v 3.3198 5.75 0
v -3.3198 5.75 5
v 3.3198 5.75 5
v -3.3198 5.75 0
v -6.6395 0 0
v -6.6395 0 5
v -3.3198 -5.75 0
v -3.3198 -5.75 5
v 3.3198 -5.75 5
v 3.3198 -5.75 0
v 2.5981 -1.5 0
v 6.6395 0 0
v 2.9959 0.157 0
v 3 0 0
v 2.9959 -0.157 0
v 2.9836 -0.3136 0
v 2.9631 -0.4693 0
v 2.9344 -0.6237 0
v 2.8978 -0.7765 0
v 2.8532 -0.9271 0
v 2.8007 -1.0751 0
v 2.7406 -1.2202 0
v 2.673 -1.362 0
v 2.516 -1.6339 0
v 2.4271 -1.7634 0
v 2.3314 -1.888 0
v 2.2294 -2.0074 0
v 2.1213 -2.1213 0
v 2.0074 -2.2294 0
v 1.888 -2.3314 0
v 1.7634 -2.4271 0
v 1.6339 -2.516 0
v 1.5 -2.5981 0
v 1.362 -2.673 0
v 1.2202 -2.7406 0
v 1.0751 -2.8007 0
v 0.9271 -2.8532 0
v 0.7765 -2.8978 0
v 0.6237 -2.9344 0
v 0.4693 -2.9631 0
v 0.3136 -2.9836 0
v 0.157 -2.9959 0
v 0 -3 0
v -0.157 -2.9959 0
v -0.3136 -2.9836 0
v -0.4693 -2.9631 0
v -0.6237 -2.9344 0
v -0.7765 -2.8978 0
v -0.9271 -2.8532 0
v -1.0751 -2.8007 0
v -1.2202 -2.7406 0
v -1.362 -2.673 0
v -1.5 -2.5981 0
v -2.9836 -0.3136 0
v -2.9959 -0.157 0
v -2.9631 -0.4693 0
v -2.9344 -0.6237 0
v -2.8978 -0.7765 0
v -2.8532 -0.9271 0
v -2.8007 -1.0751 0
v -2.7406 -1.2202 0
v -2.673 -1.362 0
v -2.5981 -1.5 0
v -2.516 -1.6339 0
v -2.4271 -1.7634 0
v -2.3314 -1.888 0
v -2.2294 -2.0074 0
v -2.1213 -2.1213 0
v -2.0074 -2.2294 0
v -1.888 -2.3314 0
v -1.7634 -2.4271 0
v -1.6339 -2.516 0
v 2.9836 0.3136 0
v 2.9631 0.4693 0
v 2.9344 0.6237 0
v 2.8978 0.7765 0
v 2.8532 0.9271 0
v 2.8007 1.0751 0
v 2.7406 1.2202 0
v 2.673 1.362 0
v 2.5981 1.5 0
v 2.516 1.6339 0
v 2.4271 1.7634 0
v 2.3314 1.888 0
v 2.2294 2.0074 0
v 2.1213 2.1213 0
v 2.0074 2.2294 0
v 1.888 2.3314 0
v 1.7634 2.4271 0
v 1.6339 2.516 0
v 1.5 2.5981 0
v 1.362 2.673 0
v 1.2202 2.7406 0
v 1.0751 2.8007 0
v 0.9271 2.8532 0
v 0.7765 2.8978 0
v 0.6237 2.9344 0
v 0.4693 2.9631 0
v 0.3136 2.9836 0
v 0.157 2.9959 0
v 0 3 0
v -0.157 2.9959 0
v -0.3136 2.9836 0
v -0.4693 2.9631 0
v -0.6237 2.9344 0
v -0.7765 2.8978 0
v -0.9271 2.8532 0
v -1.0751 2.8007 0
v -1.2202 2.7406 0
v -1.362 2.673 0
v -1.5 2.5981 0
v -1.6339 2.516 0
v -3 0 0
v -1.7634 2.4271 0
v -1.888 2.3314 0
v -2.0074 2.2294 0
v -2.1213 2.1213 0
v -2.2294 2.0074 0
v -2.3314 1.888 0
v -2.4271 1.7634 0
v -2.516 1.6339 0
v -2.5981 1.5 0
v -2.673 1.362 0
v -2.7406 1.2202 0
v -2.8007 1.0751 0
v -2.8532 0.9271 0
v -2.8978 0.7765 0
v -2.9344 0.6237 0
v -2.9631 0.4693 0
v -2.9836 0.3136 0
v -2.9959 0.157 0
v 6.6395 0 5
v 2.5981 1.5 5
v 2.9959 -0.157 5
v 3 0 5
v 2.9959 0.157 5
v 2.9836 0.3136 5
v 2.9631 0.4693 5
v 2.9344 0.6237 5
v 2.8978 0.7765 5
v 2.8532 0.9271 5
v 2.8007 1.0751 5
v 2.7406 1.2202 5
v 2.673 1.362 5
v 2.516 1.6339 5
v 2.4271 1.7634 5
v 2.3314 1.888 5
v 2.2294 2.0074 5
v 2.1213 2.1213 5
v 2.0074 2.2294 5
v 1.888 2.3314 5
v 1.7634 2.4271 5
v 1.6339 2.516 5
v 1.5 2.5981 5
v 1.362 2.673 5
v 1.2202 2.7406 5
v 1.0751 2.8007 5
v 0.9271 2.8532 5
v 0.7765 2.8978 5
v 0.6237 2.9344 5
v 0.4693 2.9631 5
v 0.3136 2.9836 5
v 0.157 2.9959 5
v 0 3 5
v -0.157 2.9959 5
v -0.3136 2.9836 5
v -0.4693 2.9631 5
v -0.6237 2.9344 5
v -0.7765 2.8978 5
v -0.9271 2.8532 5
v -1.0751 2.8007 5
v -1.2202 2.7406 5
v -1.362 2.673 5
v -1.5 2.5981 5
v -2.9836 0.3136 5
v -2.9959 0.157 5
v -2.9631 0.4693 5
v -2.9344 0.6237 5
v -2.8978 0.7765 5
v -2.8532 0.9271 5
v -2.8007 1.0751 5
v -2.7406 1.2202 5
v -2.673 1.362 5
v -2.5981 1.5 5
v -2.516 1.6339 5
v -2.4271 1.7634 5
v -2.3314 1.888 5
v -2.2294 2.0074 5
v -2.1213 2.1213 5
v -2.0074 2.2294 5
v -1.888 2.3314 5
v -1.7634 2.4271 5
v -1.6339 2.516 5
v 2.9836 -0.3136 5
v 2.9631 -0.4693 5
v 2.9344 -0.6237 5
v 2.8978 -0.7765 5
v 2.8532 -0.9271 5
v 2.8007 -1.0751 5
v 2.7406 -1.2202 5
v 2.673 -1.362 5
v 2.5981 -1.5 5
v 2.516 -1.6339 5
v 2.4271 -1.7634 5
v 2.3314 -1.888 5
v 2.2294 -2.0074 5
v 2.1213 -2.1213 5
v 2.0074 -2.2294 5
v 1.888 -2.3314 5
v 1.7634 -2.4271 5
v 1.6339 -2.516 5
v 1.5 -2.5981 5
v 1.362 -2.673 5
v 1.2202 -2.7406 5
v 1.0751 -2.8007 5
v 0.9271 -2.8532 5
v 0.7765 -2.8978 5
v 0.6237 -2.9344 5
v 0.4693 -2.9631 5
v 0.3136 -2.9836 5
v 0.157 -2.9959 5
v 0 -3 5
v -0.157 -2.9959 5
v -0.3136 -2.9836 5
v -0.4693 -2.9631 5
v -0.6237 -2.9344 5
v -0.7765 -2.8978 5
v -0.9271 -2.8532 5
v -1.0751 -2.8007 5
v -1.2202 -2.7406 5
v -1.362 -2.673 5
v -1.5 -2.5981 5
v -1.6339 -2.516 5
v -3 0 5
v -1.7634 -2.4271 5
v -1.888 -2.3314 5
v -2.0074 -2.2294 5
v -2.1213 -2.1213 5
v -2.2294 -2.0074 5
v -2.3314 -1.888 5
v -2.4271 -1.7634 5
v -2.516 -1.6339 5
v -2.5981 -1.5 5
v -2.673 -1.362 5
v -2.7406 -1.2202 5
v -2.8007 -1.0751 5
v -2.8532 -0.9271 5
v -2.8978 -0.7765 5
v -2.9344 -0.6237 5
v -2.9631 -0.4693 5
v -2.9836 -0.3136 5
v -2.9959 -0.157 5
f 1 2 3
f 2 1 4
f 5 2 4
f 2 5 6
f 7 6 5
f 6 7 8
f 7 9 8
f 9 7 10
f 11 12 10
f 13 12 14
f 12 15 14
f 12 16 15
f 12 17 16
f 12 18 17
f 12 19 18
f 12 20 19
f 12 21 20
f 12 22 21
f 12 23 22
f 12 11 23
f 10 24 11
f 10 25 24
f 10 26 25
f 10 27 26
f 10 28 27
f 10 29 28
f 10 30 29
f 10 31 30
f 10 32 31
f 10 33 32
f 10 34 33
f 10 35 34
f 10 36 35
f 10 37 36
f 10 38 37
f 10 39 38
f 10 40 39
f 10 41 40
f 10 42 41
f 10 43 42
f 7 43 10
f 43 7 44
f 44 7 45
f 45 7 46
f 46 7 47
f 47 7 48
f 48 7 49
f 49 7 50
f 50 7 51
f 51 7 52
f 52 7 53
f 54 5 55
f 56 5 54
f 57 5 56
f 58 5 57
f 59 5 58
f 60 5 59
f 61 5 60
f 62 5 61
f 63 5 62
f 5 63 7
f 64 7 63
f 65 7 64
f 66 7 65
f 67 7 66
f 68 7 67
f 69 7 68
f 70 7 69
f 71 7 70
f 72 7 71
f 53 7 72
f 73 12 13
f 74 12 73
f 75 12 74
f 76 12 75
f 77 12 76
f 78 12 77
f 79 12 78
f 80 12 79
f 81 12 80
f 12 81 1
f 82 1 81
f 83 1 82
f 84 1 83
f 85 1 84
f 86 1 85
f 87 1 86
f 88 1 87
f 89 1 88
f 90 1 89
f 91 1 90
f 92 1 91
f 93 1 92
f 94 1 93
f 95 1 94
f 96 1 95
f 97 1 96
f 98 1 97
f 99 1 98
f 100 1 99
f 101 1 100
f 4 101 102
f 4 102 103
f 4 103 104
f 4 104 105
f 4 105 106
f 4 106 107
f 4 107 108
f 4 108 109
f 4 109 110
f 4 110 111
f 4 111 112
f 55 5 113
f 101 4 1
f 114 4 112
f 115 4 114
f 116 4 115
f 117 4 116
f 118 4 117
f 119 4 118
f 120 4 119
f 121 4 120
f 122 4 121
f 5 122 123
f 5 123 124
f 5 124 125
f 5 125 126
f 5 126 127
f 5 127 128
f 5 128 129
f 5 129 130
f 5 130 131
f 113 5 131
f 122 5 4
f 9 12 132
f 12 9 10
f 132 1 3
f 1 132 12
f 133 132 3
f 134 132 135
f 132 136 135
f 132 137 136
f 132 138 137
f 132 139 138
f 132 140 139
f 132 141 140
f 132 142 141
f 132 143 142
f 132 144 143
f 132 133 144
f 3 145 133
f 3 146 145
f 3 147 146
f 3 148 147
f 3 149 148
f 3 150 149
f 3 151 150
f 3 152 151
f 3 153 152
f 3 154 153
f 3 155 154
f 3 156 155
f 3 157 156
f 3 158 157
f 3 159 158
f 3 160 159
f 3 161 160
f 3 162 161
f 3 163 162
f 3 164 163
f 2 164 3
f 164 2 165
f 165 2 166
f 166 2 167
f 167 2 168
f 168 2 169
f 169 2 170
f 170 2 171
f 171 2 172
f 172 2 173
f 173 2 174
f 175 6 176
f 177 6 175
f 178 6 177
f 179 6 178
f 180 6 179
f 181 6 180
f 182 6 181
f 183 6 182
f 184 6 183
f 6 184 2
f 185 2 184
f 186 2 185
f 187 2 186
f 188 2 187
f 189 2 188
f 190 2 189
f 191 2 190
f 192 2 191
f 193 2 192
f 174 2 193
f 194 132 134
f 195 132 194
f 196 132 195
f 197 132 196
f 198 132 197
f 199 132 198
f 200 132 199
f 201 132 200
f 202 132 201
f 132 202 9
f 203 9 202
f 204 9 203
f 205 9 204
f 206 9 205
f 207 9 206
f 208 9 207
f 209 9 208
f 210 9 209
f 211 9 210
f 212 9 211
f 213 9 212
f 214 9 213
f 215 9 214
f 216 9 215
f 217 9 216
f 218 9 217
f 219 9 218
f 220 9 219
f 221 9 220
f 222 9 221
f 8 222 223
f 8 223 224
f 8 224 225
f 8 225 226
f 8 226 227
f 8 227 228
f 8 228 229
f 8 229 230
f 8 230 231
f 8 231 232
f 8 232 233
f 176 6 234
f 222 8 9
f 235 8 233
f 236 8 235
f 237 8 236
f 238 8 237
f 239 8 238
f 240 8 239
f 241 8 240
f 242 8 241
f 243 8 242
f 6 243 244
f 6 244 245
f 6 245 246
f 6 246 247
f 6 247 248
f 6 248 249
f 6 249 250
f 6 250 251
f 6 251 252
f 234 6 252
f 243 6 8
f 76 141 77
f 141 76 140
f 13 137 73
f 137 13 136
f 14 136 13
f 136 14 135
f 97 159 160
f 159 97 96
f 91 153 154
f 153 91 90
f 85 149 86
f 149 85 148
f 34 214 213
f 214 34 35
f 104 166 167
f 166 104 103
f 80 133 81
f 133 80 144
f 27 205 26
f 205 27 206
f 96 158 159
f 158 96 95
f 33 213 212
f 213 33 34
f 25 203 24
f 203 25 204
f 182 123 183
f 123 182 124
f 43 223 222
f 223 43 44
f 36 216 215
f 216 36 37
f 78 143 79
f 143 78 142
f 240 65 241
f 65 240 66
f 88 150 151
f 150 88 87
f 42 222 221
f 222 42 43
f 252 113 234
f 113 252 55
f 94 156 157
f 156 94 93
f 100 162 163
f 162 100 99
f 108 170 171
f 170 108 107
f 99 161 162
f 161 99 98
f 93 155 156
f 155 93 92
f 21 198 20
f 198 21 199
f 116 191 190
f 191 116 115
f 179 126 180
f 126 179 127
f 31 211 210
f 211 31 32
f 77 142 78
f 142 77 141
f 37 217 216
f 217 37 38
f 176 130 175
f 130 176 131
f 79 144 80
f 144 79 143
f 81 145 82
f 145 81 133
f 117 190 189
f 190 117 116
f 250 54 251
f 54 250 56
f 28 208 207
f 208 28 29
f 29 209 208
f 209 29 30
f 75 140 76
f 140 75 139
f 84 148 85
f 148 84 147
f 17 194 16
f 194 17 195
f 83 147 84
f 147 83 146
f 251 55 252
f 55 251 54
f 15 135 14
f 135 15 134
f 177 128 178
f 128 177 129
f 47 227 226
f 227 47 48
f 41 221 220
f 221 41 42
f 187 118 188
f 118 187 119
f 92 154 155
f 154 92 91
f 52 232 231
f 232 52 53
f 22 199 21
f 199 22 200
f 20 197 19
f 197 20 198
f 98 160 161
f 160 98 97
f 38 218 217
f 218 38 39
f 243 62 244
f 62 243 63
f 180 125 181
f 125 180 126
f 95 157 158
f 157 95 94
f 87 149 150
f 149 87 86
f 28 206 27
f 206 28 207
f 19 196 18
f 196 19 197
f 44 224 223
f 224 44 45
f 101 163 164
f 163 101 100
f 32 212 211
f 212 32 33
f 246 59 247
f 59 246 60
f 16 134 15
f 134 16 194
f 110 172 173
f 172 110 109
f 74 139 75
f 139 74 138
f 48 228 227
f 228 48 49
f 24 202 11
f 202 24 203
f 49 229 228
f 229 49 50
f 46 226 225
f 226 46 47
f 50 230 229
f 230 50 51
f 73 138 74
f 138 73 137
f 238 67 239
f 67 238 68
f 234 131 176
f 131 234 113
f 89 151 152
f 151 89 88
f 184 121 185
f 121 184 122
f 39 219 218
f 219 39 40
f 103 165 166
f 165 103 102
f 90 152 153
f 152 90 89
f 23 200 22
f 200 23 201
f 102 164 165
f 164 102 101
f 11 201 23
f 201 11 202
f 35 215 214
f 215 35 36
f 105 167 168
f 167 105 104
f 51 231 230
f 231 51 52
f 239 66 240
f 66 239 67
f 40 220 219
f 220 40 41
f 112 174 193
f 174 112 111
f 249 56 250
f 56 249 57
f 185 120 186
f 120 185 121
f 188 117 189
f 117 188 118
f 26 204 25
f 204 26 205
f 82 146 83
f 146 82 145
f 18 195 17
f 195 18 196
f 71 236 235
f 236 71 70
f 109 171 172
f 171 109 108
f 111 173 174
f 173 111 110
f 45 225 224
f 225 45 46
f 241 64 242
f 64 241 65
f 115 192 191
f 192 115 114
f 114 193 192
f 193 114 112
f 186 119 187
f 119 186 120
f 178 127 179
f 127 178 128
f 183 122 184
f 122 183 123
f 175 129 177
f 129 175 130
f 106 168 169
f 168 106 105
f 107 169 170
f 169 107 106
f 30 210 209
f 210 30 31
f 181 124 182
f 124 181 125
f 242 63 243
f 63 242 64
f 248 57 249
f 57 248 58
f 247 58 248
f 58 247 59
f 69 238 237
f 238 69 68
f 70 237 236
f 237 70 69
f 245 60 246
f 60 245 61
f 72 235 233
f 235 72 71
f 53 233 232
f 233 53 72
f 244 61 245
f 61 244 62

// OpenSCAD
$fn = 120;

across_flats = 11.5;   // mm
thickness    = 5.0;    // mm
hole_d       = 6.0;    // mm (clearance hole as specified)

module hex_prism_af(af, h){
    // For a regular hexagon: across_flats = 2 * apothem
    // Circumradius R = apothem / cos(30°) = (af/2) / cos(30°)
    R = (af/2) / cos(30);
    linear_extrude(height=h)
        polygon([ for (i=[0:5]) [ R*cos(60*i), R*sin(60*i) ] ]);
}

difference(){
    hex_prism_af(across_flats, thickness);
    translate([0,0,-0.2])
        cylinder(d=hole_d, h=thickness+0.4);
}
